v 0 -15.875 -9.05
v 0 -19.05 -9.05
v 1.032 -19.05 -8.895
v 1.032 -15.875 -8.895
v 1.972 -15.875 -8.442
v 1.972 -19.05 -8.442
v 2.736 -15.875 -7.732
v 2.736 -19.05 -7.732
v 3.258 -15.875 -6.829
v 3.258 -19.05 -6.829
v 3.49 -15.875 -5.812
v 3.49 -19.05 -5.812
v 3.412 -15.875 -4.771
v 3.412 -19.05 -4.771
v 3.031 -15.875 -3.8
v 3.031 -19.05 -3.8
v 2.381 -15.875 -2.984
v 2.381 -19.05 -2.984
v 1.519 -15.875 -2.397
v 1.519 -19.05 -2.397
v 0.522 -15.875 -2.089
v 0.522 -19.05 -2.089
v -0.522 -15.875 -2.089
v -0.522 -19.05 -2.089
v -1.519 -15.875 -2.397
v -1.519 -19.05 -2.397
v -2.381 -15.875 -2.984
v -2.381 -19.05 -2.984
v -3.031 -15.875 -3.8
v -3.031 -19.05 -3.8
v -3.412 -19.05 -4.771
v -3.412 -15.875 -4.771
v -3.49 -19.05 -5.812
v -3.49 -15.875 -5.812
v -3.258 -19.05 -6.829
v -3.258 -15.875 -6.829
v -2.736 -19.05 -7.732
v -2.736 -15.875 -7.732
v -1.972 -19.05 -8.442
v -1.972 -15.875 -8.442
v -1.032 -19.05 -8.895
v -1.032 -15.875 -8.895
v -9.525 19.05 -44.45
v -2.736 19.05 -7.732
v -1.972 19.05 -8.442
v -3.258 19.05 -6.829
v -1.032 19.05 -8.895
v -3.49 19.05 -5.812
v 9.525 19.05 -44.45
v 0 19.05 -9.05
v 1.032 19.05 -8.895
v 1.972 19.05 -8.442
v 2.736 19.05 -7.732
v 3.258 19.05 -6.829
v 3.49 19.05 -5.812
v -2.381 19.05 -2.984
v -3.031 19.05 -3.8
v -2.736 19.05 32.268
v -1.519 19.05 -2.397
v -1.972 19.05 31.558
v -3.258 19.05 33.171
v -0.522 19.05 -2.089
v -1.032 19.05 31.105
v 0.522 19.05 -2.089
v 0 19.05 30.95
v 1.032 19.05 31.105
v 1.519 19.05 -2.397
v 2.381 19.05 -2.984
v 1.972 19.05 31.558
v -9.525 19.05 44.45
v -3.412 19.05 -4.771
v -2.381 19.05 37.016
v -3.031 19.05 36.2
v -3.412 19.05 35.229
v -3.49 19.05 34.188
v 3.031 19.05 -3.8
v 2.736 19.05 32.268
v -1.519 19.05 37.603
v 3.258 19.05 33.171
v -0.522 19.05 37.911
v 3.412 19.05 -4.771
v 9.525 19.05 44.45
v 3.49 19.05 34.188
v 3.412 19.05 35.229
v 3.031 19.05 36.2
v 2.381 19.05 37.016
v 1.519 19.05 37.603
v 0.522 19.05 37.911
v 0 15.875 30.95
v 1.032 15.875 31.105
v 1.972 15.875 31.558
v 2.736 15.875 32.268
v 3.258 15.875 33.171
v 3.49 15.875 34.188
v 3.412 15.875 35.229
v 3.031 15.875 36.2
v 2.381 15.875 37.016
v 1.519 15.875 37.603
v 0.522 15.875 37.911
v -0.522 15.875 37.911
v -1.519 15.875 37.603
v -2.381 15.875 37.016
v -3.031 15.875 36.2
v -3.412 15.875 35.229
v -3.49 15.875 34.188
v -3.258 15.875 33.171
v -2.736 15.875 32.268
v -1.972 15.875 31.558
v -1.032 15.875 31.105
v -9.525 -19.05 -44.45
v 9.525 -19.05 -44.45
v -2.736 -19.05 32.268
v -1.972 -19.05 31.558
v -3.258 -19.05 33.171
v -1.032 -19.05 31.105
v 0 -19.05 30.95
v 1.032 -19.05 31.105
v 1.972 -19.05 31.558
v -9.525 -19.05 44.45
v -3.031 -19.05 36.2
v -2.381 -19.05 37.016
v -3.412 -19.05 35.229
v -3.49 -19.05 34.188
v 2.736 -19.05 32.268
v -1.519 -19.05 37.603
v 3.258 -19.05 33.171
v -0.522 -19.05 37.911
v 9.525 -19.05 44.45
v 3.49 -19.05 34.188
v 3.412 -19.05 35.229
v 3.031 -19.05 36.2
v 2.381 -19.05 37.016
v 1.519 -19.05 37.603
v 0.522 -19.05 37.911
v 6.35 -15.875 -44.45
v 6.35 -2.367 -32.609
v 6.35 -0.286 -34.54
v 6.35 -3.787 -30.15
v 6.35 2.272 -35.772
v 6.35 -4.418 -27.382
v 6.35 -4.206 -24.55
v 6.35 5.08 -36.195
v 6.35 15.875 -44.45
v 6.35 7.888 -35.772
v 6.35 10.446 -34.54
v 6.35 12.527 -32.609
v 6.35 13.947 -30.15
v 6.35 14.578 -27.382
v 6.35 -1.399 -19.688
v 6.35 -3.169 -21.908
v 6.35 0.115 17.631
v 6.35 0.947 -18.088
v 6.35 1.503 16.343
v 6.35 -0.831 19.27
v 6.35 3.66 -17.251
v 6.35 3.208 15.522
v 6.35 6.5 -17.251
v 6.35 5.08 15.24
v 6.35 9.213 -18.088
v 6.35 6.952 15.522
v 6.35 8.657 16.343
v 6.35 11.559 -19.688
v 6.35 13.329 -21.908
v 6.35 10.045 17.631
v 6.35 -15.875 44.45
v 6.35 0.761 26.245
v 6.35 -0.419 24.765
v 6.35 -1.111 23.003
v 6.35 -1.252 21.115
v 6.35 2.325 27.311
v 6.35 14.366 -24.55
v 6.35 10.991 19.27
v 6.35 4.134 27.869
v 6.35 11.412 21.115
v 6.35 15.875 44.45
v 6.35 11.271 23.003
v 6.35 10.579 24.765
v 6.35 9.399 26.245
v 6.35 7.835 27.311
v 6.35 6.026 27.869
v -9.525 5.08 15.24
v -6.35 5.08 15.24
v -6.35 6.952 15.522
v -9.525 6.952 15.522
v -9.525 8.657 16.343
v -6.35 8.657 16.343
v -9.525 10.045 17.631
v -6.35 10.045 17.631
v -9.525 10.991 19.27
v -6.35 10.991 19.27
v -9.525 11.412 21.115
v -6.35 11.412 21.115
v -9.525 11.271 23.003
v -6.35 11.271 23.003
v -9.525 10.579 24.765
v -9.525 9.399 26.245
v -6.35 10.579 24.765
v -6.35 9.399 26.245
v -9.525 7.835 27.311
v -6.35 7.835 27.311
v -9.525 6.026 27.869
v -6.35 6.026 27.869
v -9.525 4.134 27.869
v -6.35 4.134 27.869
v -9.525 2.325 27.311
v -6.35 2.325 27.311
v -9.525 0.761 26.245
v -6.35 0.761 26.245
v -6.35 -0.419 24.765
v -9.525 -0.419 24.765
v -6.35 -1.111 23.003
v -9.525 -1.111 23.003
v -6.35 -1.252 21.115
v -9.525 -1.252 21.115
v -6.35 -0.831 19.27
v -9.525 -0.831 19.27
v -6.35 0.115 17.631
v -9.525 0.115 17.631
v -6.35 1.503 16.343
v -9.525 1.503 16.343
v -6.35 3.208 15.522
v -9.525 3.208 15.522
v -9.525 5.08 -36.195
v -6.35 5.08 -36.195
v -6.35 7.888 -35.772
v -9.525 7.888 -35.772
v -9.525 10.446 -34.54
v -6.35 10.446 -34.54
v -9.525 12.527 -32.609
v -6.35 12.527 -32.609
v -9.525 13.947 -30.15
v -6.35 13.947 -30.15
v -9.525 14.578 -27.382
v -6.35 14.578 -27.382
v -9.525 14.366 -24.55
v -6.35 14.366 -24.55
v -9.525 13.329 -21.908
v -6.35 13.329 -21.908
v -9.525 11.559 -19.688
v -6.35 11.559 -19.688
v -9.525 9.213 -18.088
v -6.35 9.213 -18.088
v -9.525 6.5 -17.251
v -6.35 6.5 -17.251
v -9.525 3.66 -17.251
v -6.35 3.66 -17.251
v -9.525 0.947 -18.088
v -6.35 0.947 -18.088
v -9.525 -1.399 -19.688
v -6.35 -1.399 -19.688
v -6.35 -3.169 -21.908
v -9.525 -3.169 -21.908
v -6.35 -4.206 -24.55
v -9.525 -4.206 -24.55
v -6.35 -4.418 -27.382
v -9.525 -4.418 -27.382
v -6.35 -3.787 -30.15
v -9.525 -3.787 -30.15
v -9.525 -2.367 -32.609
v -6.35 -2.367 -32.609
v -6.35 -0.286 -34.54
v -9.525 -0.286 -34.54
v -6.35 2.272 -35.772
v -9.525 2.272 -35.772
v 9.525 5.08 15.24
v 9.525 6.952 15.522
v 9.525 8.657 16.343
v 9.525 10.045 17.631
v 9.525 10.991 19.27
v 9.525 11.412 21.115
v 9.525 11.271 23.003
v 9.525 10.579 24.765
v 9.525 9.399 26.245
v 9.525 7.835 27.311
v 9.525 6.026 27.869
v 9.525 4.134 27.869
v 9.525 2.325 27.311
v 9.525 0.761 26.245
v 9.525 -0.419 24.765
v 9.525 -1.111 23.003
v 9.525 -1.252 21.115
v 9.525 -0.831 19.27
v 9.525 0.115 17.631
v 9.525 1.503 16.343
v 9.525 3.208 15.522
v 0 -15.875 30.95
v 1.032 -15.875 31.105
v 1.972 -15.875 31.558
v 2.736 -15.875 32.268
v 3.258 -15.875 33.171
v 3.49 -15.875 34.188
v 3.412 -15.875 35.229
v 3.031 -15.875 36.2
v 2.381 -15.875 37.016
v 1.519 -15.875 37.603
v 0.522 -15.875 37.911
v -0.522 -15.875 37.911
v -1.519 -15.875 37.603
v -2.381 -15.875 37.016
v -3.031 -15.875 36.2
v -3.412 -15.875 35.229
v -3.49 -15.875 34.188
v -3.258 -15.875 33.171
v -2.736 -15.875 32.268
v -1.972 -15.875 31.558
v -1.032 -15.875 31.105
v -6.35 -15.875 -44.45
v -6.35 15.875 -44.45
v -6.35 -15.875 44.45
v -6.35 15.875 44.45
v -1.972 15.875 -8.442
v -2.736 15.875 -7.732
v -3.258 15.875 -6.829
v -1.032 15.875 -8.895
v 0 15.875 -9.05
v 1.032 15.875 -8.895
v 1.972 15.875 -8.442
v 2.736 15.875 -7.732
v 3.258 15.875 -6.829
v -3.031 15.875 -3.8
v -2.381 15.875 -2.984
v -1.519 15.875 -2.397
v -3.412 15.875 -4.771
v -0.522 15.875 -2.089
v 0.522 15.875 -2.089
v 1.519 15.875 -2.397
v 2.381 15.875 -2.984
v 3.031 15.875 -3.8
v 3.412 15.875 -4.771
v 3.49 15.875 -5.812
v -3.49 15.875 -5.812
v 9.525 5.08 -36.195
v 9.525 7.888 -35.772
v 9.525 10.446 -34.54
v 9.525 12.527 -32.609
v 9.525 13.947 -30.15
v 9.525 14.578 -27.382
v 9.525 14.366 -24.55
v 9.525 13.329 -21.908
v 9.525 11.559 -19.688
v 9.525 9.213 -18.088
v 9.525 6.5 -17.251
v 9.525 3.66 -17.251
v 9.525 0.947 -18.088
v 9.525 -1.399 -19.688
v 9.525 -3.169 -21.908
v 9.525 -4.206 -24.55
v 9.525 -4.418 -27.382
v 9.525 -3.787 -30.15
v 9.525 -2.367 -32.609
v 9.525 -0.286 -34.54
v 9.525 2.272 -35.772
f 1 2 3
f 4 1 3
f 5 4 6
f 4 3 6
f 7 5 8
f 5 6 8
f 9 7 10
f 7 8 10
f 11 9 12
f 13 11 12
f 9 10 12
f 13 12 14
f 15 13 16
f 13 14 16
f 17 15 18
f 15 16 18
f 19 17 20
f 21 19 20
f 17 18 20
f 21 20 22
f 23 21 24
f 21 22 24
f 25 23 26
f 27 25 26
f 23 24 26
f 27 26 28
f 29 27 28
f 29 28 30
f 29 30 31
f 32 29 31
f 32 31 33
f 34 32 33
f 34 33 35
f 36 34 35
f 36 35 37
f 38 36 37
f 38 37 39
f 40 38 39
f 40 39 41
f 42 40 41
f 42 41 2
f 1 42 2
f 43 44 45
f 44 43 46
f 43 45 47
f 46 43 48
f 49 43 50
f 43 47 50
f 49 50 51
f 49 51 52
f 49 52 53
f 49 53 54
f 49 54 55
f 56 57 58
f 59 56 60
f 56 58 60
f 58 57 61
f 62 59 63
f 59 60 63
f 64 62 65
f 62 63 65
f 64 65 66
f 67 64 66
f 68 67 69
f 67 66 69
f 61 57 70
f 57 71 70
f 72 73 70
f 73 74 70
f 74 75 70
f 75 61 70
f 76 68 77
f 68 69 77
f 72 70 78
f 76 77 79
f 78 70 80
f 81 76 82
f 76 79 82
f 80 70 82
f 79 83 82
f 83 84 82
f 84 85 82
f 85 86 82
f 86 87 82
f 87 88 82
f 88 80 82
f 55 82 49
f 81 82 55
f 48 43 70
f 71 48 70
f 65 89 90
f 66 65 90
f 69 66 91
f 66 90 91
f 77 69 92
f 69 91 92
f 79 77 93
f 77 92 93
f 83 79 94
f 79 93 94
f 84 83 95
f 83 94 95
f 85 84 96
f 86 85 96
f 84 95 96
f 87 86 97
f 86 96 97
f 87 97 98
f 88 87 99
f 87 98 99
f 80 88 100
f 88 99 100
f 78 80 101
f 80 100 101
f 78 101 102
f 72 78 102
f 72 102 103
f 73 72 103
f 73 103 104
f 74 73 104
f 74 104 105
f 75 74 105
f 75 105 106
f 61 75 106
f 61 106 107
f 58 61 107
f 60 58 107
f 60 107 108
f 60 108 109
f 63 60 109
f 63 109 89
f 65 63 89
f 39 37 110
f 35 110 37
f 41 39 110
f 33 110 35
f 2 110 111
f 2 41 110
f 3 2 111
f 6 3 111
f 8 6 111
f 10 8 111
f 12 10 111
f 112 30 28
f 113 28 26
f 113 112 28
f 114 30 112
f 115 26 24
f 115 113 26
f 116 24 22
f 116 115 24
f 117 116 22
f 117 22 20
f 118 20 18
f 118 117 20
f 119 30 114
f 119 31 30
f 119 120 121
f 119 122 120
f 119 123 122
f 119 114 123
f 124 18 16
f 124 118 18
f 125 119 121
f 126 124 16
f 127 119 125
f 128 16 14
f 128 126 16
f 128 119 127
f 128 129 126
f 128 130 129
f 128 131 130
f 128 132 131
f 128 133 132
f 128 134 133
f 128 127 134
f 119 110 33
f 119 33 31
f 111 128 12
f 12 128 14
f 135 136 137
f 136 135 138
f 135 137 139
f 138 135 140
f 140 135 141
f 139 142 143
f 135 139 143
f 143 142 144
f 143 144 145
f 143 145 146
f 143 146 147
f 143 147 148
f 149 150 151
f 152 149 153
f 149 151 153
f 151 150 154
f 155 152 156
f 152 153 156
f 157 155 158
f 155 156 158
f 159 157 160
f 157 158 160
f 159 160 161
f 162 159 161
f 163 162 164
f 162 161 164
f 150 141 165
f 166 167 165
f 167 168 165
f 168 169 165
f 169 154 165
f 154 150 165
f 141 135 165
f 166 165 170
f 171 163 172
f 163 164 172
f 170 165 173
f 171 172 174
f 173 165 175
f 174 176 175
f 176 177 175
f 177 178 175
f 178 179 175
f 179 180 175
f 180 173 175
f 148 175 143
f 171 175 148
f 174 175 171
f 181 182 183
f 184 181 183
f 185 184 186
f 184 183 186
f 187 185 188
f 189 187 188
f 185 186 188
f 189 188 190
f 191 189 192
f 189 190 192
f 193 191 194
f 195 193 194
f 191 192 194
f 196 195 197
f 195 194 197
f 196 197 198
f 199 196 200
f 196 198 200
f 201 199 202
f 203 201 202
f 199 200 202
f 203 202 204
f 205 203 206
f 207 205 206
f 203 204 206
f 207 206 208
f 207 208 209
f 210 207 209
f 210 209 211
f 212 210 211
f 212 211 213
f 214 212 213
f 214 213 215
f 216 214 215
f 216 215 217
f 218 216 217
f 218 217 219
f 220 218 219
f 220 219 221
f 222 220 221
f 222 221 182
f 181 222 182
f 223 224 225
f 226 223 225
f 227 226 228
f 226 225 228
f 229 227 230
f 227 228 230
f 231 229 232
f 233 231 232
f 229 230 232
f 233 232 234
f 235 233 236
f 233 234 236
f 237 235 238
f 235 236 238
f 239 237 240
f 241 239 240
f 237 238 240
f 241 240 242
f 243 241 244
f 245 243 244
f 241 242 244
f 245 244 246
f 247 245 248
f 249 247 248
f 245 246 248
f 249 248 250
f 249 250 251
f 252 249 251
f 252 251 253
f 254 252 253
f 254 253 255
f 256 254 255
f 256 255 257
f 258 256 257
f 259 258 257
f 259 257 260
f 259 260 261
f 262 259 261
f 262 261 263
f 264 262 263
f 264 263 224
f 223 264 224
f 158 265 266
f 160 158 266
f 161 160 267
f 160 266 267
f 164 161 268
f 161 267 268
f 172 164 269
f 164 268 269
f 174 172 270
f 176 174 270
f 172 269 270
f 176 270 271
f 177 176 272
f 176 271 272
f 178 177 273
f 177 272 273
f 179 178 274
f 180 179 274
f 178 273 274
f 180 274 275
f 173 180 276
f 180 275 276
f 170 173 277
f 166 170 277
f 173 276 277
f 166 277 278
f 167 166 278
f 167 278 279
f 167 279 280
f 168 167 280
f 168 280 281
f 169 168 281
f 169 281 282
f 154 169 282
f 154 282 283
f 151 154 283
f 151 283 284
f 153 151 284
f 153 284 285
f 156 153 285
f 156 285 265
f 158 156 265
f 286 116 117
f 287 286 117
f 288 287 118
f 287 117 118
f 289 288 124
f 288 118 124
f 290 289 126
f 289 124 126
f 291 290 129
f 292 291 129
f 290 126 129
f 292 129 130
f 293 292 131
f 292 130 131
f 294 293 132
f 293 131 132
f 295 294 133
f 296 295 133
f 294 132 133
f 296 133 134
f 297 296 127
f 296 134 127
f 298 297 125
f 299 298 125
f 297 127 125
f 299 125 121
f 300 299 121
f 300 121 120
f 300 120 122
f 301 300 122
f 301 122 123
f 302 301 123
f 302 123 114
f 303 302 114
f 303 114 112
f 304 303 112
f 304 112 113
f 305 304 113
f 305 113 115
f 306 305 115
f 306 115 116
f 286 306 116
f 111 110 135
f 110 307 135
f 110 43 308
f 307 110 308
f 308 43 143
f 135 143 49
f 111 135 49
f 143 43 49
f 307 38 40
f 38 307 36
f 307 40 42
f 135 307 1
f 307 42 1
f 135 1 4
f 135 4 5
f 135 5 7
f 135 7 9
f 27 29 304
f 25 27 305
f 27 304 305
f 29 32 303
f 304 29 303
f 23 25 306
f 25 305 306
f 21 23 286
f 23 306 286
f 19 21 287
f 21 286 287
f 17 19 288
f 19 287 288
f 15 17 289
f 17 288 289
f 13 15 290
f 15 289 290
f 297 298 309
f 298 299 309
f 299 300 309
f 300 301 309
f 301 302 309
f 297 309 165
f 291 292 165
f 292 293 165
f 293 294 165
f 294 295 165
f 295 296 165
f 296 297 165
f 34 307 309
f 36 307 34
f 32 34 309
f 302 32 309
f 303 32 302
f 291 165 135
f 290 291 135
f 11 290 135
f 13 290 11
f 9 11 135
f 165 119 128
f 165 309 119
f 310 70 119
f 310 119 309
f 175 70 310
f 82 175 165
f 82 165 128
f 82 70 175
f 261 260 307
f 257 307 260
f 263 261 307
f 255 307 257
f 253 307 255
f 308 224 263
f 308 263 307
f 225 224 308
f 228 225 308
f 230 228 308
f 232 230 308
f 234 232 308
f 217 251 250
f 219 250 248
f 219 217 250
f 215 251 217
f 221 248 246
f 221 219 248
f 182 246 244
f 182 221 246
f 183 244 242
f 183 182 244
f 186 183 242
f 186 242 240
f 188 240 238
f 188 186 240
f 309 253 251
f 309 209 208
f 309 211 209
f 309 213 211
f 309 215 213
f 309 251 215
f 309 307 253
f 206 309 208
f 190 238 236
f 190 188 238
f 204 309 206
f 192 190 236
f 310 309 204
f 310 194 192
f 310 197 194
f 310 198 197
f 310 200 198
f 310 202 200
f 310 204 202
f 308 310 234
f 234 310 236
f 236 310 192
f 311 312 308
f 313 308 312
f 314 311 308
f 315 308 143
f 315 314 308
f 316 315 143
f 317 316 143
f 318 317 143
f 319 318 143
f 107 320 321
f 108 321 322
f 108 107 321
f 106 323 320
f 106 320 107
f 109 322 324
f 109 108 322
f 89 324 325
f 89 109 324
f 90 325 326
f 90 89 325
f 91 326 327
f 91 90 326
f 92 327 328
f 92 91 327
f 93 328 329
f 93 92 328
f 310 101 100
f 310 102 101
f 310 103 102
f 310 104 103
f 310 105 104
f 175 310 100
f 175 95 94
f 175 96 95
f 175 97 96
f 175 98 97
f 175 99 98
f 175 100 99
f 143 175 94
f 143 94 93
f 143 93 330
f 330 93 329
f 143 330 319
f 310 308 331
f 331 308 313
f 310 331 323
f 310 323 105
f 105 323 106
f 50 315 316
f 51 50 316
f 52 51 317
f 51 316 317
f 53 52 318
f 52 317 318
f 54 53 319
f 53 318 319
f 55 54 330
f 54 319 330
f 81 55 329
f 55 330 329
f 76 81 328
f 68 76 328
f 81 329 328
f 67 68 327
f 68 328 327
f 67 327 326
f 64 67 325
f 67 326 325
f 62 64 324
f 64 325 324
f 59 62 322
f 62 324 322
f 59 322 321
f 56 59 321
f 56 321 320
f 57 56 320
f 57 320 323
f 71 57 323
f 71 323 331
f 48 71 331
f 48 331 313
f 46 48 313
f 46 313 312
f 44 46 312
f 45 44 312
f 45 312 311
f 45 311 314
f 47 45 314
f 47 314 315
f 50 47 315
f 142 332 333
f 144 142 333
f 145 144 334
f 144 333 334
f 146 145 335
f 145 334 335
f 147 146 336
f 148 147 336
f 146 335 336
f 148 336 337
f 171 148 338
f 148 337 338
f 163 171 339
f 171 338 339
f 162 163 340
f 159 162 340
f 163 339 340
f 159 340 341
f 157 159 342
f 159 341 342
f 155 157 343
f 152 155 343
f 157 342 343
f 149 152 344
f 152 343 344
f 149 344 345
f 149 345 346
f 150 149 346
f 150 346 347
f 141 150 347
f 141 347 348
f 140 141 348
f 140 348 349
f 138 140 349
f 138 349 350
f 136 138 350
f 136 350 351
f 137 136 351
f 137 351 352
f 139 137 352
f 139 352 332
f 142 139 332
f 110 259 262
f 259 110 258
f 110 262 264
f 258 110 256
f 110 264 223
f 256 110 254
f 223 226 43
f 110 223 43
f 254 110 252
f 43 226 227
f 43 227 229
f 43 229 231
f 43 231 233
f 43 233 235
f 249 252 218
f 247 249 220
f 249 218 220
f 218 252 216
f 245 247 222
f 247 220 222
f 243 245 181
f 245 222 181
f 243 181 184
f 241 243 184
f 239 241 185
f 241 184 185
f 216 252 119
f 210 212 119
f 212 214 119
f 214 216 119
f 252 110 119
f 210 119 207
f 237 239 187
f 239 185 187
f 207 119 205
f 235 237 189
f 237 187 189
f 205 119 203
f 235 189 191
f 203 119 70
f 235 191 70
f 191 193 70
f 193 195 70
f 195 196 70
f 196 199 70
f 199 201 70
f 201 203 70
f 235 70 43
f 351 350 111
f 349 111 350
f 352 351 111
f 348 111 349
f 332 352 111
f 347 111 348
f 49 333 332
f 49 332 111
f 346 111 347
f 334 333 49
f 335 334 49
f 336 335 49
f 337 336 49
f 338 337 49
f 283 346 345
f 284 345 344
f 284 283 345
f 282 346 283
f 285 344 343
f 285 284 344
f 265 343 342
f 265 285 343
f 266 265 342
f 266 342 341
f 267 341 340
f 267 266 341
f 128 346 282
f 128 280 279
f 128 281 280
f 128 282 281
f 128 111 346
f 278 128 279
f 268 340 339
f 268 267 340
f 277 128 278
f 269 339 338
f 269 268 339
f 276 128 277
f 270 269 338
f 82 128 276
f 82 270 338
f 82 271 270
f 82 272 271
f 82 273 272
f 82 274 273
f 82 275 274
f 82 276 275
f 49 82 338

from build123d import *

# Parameters (mm, degrees)
SKETCH1_W           = 19.05
SKETCH1_H           = 38.1
SKETCH1_W_2         = 12.7
SKETCH1_H_2         = 31.75
BOSS_EXTRUDE1_DEPTH = 44.45
SKETCH2_R           = 3.5
CUT_EXTRUDE1_DEPTH  = 76.2
SKETCH3_R           = 6.35
SKETCH3_R_2         = 9.525
CUT_EXTRUDE2_DEPTH  = 52.976990101


with BuildPart() as part:
    # Sketch1 → Boss-Extrude1 (new, symmetric)
    with BuildSketch(Plane.XY):
        Rectangle(SKETCH1_W, SKETCH1_H)
        Rectangle(SKETCH1_W_2, SKETCH1_H_2, mode=Mode.SUBTRACT)
    extrude(amount=BOSS_EXTRUDE1_DEPTH, both=True)

    # Sketch2 → Cut-Extrude1 (cut)
    with BuildSketch(Plane.XZ.offset(19.05)):
        with Locations(Location((0, 34.45, 0), (0, 0, 270))):
            Circle(SKETCH2_R)
        with Locations(Location((0, -5.55, 0), (0, 0, 270))):
            Circle(SKETCH2_R)
    extrude(amount=-CUT_EXTRUDE1_DEPTH, mode=Mode.SUBTRACT)

    # Sketch3 → Cut-Extrude2 (cut, through all)
    with BuildSketch(Plane(origin=(9.525, 0, 0), x_dir=(0, 0, -1), z_dir=(1, 0, 0))):
        with Locations((-21.59, 5.08)):
            Circle(SKETCH3_R)
        with Locations((26.67, 5.08)):
            Circle(SKETCH3_R_2)
    extrude(amount=-CUT_EXTRUDE2_DEPTH, mode=Mode.SUBTRACT)


solid = part.part
